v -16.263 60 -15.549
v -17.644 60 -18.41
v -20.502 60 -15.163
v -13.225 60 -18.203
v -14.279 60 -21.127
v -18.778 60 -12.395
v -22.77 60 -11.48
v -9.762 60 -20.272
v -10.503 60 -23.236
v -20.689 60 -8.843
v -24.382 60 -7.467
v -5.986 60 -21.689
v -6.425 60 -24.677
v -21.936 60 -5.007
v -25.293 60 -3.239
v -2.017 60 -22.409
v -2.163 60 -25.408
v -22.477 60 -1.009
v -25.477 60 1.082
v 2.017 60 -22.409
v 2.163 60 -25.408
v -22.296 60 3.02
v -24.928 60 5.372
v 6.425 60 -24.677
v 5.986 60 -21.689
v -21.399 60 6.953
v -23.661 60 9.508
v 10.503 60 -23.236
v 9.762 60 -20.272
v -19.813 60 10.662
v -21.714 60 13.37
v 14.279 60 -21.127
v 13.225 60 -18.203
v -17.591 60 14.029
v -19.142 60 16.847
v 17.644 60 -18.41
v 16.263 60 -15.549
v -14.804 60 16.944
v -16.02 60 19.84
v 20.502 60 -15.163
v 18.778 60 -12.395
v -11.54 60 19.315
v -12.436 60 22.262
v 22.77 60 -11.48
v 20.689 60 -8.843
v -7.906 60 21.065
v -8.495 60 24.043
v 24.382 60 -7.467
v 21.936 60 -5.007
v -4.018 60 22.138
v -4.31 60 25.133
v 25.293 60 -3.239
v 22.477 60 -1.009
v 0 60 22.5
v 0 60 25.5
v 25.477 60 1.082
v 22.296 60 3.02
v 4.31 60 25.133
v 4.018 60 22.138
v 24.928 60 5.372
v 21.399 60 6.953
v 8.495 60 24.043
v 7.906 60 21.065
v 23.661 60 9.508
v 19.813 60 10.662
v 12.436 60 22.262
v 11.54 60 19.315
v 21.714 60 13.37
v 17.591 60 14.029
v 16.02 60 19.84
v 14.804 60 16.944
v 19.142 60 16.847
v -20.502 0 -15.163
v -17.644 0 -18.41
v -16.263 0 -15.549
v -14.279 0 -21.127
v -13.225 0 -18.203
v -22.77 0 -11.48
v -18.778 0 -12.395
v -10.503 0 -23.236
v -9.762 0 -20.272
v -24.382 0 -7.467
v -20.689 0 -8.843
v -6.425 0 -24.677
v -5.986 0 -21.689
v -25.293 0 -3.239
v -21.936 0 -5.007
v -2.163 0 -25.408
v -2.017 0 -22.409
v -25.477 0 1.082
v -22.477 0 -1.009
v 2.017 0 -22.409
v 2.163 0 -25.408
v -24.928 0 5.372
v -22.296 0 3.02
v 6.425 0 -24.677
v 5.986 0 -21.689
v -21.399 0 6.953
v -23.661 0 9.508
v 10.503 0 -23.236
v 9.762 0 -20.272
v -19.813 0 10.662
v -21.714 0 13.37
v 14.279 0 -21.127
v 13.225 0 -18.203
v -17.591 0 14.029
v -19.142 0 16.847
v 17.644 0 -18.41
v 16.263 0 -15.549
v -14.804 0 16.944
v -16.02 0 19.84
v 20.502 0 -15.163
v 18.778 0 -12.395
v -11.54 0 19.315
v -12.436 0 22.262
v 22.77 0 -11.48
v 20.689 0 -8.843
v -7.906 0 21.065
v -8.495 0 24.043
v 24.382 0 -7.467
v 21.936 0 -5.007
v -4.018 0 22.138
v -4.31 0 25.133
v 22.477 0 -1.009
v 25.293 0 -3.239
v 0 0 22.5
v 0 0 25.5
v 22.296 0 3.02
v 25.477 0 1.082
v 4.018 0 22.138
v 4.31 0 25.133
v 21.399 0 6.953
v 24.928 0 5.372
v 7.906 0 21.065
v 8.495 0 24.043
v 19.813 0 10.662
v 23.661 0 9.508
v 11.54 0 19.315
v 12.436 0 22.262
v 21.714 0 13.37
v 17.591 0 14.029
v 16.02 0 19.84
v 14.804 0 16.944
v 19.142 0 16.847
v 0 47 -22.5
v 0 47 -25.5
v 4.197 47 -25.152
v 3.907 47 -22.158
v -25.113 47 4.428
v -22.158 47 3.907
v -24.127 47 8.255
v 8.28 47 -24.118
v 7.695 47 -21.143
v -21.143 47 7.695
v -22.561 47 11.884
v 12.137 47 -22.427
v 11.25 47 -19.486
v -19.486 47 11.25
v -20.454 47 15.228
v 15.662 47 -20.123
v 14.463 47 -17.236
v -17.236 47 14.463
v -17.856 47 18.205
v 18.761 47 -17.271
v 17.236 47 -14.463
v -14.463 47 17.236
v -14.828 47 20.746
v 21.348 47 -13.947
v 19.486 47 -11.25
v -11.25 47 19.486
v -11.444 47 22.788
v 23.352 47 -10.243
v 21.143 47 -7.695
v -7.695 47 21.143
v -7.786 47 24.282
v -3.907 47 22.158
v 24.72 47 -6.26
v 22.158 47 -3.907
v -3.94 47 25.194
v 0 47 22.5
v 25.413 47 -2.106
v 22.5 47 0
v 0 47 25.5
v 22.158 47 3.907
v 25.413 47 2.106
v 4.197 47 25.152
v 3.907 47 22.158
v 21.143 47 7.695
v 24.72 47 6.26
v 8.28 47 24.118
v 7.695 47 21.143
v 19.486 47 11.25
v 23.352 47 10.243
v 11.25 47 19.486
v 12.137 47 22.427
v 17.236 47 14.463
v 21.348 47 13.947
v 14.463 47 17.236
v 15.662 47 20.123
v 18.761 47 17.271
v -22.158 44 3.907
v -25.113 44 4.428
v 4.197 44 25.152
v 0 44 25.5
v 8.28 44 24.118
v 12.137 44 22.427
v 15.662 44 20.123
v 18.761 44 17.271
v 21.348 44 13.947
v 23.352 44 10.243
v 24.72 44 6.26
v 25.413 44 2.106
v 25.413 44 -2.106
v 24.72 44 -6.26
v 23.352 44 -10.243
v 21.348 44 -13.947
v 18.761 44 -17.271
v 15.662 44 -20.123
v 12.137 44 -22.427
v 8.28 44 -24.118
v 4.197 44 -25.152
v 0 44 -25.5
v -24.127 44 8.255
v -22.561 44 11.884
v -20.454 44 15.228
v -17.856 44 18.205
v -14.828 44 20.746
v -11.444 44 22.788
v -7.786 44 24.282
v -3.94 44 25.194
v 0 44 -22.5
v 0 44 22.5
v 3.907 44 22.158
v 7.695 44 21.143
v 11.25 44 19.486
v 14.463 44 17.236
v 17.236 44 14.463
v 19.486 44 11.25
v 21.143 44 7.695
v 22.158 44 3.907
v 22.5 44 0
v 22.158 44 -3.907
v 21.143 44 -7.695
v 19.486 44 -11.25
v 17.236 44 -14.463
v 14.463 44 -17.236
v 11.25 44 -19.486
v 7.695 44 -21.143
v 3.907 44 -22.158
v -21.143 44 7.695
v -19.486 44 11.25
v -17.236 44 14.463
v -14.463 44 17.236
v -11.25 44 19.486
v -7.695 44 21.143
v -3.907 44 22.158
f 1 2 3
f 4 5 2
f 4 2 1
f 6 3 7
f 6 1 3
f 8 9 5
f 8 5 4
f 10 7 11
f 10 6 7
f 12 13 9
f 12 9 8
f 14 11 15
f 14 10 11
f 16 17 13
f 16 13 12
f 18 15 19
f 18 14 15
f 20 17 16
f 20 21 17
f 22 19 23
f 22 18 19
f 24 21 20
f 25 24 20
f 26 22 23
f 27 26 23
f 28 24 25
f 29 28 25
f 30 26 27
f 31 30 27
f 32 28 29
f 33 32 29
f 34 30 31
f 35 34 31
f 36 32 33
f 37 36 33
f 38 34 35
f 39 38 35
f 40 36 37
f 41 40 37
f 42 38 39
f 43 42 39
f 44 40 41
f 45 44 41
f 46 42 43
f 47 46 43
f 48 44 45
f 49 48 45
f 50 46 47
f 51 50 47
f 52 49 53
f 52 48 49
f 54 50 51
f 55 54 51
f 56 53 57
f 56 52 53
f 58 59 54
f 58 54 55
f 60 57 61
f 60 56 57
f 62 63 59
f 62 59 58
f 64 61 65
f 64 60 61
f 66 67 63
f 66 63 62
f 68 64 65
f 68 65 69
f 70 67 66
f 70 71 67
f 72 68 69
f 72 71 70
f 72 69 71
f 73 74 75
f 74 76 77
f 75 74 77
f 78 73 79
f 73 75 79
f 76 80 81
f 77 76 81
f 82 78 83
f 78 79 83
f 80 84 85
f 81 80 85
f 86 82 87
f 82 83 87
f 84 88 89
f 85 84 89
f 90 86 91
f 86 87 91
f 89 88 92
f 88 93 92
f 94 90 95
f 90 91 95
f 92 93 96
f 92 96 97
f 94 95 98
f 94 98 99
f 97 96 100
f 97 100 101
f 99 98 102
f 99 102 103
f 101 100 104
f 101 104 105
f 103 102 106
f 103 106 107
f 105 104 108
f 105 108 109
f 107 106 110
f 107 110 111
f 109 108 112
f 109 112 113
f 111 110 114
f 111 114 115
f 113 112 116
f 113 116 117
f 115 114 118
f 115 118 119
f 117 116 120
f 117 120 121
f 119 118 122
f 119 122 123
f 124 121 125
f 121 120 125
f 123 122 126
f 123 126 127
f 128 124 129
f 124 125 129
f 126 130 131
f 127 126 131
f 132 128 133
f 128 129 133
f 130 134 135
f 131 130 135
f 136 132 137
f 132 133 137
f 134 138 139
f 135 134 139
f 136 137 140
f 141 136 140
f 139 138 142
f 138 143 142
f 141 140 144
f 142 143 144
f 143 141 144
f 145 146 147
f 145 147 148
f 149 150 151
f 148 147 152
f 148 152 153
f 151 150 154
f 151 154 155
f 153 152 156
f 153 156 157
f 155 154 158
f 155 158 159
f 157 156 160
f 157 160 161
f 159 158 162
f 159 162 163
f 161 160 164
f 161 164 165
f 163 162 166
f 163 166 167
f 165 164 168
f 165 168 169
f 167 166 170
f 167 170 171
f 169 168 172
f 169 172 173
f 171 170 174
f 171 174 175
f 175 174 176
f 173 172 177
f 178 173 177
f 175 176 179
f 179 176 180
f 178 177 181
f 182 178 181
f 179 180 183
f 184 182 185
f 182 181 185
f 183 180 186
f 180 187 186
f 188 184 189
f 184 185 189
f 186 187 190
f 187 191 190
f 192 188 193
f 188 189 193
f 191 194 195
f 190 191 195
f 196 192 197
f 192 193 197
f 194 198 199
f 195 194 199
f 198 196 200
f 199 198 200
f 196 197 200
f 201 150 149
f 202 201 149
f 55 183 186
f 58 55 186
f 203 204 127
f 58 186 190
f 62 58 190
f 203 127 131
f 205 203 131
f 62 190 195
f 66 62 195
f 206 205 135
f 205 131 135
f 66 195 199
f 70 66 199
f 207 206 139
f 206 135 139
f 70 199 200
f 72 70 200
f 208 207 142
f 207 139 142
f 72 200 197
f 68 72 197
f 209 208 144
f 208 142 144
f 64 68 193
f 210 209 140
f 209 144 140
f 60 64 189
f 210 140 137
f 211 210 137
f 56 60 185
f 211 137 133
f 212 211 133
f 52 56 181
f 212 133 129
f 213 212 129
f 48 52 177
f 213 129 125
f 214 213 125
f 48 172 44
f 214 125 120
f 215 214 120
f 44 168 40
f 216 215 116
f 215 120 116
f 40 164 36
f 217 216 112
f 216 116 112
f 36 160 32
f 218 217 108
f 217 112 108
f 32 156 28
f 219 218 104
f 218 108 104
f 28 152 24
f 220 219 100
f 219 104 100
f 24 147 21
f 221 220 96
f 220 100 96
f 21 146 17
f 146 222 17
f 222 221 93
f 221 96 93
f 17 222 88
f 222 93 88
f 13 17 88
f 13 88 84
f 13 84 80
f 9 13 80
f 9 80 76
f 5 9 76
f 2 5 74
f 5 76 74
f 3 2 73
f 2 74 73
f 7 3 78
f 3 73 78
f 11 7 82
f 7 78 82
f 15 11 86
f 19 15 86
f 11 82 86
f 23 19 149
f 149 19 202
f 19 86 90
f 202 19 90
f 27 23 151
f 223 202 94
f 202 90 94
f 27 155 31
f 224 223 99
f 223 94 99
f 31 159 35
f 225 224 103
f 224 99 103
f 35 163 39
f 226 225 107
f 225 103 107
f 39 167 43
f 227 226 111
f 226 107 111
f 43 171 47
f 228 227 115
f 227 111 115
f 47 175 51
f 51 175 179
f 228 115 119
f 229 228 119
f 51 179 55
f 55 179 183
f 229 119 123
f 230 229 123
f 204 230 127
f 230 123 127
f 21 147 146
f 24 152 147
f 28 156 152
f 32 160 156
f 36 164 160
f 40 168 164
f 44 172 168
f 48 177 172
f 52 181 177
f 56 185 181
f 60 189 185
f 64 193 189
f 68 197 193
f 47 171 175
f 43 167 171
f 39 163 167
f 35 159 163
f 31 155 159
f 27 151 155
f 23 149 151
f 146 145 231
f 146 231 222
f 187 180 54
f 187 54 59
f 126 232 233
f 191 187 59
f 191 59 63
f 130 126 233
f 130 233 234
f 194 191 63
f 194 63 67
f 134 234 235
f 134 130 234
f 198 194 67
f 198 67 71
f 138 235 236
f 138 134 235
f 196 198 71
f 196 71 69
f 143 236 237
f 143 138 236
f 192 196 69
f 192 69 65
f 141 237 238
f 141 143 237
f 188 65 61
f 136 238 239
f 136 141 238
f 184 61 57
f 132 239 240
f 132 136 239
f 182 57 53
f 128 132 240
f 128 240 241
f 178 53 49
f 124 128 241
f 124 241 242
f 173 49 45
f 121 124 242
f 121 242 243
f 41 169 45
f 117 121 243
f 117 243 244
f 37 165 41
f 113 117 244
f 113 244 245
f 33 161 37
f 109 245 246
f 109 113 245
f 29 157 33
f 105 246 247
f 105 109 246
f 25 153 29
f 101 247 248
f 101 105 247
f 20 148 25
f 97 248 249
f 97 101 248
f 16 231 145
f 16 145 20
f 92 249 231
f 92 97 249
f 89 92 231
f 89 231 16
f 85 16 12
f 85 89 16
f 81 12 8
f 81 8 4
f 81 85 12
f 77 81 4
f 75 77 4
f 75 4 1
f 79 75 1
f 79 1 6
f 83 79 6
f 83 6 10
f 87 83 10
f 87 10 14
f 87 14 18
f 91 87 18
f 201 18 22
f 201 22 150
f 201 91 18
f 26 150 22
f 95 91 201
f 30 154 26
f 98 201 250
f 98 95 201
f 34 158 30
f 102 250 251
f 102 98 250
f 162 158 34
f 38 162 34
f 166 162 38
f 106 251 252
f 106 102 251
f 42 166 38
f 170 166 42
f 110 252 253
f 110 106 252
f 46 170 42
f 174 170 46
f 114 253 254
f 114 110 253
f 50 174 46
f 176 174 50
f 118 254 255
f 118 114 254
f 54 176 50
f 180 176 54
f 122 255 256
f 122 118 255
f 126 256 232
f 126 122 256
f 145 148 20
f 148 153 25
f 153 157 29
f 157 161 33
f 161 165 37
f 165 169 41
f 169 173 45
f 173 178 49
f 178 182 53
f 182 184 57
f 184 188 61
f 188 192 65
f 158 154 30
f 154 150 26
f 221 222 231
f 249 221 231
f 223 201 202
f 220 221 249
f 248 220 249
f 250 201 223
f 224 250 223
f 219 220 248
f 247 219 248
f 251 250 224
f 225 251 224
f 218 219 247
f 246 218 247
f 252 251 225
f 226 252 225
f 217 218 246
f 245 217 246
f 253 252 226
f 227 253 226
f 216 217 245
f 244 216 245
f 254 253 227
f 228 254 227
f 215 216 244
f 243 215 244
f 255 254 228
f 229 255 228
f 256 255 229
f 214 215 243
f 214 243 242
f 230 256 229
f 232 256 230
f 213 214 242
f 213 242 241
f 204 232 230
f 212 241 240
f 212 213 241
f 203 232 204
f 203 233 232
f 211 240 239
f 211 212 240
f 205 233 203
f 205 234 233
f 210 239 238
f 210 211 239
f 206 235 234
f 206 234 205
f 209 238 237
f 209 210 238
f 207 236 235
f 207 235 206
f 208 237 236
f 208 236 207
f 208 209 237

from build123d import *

# Parameters (mm, degrees)
SKETCH_1_R          = 25.5
SKETCH_1_R_2        = 22.5
EXTRUDE_1_DEPTH     = 60
SKETCH_2_W          = 46.809184836
SKETCH_2_H          = 3
CUT_REVOLVE_1_ANGLE = 260


with BuildPart() as part:
    # 草图1 → 凸台-拉伸1 (new body)
    with BuildSketch(Plane(origin=(0, 0, 0), x_dir=(1, 0, 0), z_dir=(0, 1, 0))):
        Circle(SKETCH_1_R)
        Circle(SKETCH_1_R_2, mode=Mode.SUBTRACT)
    extrude(amount=EXTRUDE_1_DEPTH)

    # 草图2 → 切除-旋转1 (revolve, cut)
    with BuildSketch(Plane(origin=(0, 0, 0), x_dir=(0, 0, -1), z_dir=(1, 0, 0))):
        with Locations((23.404592418, 45.5)):
            Rectangle(SKETCH_2_W, SKETCH_2_H)
    revolve(axis=Axis((0, 60.338123586, 0), (0, -1, 0)), revolution_arc=CUT_REVOLVE_1_ANGLE, mode=Mode.SUBTRACT)


solid = part.part
